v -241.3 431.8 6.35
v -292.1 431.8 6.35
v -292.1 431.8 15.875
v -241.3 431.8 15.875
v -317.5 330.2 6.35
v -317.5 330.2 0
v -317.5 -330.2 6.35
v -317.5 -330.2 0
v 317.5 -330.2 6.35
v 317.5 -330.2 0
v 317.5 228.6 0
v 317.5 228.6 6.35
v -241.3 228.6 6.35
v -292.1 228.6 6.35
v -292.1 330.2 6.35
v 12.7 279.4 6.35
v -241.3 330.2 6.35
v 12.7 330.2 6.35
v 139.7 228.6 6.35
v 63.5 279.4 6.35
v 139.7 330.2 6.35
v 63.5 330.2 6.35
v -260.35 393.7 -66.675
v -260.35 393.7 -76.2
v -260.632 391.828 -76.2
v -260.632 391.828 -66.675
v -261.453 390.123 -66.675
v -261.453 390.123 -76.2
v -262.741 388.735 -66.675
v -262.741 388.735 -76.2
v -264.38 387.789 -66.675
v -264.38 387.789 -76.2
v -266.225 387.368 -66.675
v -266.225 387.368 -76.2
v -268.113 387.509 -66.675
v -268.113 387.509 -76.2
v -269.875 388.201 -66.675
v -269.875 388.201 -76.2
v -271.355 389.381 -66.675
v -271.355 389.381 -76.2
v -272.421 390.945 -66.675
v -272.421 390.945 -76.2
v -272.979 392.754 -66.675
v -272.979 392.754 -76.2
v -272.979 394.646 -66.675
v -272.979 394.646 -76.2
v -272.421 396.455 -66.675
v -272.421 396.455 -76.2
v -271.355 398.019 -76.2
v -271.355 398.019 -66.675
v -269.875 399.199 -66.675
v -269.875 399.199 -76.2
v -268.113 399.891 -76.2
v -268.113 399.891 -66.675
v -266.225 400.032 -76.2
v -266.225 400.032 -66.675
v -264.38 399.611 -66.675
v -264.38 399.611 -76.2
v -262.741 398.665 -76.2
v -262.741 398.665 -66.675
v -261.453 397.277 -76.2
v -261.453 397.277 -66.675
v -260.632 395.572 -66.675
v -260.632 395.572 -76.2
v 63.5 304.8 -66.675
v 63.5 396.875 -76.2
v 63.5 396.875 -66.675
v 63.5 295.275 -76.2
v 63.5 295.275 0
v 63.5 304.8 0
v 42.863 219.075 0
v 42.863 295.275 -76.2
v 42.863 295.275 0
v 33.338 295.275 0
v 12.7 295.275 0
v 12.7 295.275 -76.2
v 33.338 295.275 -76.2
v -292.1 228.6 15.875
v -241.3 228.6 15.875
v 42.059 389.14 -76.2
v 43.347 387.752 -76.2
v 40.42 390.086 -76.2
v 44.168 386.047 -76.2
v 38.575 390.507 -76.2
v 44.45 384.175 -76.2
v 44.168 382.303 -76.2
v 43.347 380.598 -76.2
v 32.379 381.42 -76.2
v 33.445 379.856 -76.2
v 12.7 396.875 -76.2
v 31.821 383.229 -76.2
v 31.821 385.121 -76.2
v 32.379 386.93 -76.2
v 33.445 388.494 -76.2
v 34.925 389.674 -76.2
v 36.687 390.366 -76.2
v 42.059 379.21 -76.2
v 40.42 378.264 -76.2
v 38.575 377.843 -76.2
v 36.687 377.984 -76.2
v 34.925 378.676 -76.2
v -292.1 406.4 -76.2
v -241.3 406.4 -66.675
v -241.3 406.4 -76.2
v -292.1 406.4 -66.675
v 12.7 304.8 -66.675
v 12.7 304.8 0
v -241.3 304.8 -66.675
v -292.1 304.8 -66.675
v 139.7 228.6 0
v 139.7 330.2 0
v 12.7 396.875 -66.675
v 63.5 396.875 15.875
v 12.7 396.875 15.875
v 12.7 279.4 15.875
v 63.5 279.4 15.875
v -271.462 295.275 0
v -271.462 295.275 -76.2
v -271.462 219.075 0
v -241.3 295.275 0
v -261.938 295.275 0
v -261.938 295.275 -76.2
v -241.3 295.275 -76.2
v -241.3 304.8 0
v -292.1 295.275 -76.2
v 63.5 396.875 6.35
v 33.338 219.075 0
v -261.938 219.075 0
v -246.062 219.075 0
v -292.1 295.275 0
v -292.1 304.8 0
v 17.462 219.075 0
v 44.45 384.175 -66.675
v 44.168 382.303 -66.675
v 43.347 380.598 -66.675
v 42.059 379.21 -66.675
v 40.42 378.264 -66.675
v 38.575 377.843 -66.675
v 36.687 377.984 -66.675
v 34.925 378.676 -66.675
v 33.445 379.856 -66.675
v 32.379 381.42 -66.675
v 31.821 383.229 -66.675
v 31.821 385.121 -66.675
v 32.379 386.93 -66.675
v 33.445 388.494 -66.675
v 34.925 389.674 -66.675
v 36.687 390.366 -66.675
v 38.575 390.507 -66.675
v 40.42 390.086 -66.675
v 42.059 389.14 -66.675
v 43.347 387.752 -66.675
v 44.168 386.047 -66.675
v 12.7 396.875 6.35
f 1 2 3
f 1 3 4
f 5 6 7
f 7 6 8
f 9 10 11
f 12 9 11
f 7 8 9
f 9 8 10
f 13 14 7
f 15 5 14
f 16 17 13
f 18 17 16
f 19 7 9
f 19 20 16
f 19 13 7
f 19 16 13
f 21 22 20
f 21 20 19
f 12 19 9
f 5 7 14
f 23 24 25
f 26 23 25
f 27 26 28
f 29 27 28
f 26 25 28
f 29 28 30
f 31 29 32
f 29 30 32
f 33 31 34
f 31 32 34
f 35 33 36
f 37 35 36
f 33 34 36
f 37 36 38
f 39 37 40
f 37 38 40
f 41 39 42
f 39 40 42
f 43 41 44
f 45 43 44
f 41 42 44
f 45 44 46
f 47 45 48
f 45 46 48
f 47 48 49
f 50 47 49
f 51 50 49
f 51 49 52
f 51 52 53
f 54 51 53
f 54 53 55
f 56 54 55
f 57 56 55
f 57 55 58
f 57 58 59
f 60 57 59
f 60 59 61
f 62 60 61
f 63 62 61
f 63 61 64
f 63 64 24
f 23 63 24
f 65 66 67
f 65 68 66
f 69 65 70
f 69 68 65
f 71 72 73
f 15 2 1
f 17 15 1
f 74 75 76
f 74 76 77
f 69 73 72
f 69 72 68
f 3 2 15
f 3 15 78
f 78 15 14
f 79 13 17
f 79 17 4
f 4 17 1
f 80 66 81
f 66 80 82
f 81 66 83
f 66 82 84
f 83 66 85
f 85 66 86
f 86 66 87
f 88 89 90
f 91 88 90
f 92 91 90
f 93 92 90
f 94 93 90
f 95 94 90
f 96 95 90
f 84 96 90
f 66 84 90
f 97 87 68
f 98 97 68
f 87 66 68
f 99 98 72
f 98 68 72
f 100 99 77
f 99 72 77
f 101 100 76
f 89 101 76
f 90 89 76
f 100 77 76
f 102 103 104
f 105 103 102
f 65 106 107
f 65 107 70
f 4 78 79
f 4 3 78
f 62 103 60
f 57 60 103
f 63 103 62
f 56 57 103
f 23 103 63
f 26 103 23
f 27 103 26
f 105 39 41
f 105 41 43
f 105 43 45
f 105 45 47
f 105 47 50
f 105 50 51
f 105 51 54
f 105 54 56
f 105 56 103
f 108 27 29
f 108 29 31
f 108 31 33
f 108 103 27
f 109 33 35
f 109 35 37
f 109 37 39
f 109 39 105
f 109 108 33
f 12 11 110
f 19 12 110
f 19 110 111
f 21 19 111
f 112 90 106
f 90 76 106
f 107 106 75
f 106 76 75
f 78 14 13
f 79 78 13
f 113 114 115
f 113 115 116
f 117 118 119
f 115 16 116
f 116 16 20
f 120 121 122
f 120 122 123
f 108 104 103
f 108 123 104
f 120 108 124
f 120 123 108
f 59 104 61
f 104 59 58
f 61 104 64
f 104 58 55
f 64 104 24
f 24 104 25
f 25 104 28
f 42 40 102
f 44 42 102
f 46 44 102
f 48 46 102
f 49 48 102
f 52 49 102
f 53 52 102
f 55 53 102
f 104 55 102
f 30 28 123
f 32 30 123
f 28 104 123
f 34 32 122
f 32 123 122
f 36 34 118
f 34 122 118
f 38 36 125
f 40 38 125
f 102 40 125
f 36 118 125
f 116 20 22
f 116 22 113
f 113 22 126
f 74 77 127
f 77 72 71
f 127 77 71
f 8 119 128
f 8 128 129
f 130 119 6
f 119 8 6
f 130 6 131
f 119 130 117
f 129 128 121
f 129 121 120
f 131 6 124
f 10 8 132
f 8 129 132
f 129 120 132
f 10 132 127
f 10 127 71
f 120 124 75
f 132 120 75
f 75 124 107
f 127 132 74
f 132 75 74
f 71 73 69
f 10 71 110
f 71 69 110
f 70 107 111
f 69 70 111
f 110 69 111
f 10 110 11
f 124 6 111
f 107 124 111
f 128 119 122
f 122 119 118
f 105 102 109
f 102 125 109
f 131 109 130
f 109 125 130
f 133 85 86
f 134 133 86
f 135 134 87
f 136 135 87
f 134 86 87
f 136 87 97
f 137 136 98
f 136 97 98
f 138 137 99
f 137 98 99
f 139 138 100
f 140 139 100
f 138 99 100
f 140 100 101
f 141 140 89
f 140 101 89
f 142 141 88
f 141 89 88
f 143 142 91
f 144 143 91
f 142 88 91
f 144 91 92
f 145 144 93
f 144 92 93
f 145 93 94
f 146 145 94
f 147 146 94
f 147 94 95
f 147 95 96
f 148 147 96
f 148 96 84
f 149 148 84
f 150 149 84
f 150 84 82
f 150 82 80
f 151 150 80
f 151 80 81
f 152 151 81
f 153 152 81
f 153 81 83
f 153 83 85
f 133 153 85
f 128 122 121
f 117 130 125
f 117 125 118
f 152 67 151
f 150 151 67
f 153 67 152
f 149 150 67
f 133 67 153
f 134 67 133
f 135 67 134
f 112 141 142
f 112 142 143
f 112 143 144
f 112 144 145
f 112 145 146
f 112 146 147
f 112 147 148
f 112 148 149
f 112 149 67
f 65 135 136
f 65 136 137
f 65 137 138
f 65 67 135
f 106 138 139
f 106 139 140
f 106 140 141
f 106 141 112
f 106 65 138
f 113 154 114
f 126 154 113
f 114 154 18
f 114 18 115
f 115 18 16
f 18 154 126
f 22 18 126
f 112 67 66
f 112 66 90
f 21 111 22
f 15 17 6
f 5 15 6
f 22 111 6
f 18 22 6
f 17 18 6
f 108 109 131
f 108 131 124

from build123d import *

# Parameters (mm, degrees)
F1_DEPTH  = 6.35
F2_W      = 50.8
F2_H      = 101.6
F3_DEPTH  = 9.525
F4_W      = 50.8
F4_H      = 9.525
F5_DEPTH  = 76.2
F6_W      = 50.8
F6_H      = 9.525
F7_DEPTH  = 92.075
F8_R      = 6.35
F9_DEPTH  = 25.4
F10_W     = 50.8
F10_H     = 66.675
F10_H_2   = 50.8
F11_DEPTH = 9.525
F12_W     = 9.525
F12_H     = 76.2
F13_DEPTH = 76.2
F15_DEPTH = 25.4
F16_W     = 50.8
F16_H     = 9.525
F17_DEPTH = 76.2
F18_W     = 50.8
F18_H     = 9.525
F19_DEPTH = 101.6
F20_R     = 6.35
F21_DEPTH = 25.4
F22_W     = 9.525
F22_H     = 76.2
F23_DEPTH = 76.2
F25_DEPTH = 25.4


with BuildPart() as f1:
    # F0 (on Top) → F1 (new body)
    with BuildSketch(Plane.XY):
        Polygon((-317.5, -330.2), (317.5, -330.2), (317.5, 228.6), (139.7, 228.6), (139.7, 330.2), (-317.5, 330.2), align=None)
    extrude(amount=F1_DEPTH)

    # F2 (on face) → F3 (join)
    with BuildSketch(Plane.XY.offset(6.35)):
        with Locations((-266.7, 279.4)):
            Rectangle(F2_W, F2_H)
        with Locations((-266.7, 381)):
            Rectangle(F2_W, F2_H)
    extrude(amount=F3_DEPTH)

    # F4 (on face) → F5 (join)
    with BuildSketch(Plane(origin=(0, 0, 0), x_dir=(1, 0, 0), z_dir=(0, 0, -1))):
        with Locations((38.1, -300.0375)):
            Rectangle(F4_W, F4_H)
    extrude(amount=F5_DEPTH)

    # F6 (on face) → F7 (join)
    with BuildSketch(Plane(origin=(0, 304.8, 0), x_dir=(-1, 0, 0), z_dir=(0, 1, 0))):
        with Locations((-38.1, -71.4375)):
            Rectangle(F6_W, F6_H)
    extrude(amount=F7_DEPTH)

    # F8 (on face) → F9 (cut)
    with BuildSketch(Plane(origin=(0, 0, -76.2), x_dir=(1, 0, 0), z_dir=(0, 0, -1))):
        with Locations((38.1, -384.175)):
            Circle(F8_R)
    extrude(amount=-F9_DEPTH, mode=Mode.SUBTRACT)

    # F10 (on face) → F11 (join)
    with BuildSketch(Plane.XY.offset(6.35)):
        with Locations((38.1, 363.5375)):
            Rectangle(F10_W, F10_H)
        with Locations((38.1, 304.8)):
            Rectangle(F10_W, F10_H_2)
    extrude(amount=F11_DEPTH)

    # F12 (on face) → F13 (join)
    with BuildSketch(Plane.XZ.offset(-295.275)):
        with Locations((38.1, -38.1)):
            Rectangle(F12_W, F12_H)
    extrude(amount=F13_DEPTH)

    # F14 (on face) → F15 (cut)
    with BuildSketch(Plane.YZ.offset(42.8625)):
        Polygon((219.075, -76.2), (295.275, -76.2), (219.075, 0), align=None)
    extrude(amount=-F15_DEPTH, mode=Mode.SUBTRACT)

    # F16 (on face) → F17 (join)
    with BuildSketch(Plane(origin=(0, 0, 0), x_dir=(1, 0, 0), z_dir=(0, 0, -1))):
        with Locations((-266.7, -300.0375)):
            Rectangle(F16_W, F16_H)
    extrude(amount=F17_DEPTH)

    # F18 (on face) → F19 (join)
    with BuildSketch(Plane(origin=(0, 304.8, 0), x_dir=(-1, 0, 0), z_dir=(0, 1, 0))):
        with Locations((266.7, -71.4375)):
            Rectangle(F18_W, F18_H)
    extrude(amount=F19_DEPTH)

    # F20 (on face) → F21 (cut)
    with BuildSketch(Plane(origin=(0, 0, -76.2), x_dir=(1, 0, 0), z_dir=(0, 0, -1))):
        with Locations((-266.7, -393.7)):
            Circle(F20_R)
    extrude(amount=-F21_DEPTH, mode=Mode.SUBTRACT)

    # F22 (on face) → F23 (join)
    with BuildSketch(Plane.XZ.offset(-295.275)):
        with Locations((-266.7, -38.1)):
            Rectangle(F22_W, F22_H)
    extrude(amount=F23_DEPTH)

    # F24 (on face) → F25 (cut)
    with BuildSketch(Plane(origin=(-271.4625, 0, 0), x_dir=(0, -1, 0), z_dir=(-1, 0, 0))):
        Polygon((-219.075, 0), (-295.275, -76.2), (-219.075, -76.2), align=None)
    extrude(amount=-F25_DEPTH, mode=Mode.SUBTRACT)


solid = f1.part
